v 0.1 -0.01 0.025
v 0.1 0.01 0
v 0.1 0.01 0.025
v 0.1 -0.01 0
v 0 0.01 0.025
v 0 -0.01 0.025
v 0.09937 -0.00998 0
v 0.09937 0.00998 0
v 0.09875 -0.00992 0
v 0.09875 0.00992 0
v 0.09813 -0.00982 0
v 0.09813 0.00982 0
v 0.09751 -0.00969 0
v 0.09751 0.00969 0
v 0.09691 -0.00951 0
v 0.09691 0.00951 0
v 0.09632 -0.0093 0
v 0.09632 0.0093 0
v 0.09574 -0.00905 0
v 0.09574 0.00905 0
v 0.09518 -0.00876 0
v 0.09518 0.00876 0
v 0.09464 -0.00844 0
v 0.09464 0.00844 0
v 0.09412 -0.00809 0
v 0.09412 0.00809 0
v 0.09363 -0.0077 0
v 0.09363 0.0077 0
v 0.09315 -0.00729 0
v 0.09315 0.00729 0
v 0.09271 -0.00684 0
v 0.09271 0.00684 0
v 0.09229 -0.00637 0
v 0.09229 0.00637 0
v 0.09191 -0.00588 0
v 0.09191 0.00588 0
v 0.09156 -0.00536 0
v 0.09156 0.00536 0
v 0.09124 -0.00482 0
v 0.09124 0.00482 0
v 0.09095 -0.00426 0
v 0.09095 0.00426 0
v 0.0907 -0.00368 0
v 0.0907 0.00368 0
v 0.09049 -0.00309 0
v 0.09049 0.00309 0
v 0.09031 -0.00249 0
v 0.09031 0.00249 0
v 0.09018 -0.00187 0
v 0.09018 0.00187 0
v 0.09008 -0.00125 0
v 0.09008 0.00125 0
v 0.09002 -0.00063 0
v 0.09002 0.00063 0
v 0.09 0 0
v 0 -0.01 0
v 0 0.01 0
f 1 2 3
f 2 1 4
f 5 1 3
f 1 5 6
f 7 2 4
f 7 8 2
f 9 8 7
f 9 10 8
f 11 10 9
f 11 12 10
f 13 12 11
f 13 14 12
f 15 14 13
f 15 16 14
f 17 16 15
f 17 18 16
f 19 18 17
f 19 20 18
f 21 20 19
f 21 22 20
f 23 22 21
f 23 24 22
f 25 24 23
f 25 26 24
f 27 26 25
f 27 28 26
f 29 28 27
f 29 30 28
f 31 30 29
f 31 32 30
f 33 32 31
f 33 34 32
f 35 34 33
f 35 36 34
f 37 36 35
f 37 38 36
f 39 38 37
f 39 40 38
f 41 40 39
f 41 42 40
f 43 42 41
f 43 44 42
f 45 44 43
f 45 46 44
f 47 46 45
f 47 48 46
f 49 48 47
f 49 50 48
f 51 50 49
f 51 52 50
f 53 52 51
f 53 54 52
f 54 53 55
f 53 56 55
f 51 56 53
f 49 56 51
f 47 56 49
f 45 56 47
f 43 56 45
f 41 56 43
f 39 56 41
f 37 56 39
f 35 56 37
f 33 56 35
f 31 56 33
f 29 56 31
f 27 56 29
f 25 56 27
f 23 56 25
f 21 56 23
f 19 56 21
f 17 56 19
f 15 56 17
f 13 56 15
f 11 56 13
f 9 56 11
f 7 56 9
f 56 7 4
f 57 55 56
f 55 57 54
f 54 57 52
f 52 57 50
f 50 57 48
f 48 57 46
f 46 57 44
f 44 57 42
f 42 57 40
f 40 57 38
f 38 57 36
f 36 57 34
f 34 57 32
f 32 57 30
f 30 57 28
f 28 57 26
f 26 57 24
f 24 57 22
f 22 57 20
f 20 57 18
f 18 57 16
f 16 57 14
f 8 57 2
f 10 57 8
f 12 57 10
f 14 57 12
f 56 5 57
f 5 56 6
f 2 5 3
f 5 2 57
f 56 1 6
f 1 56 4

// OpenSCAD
s = 1;

length = 0.1;
width = 0.025;
depth = 0.020;
chfdepth = 0;
chfangle = 45;
cutpos = 0.1;
cutoffset = 0.0;
cutdepth = 0.0;
cutdiameter = 0.02;

/* Produces basic box finger */
module basicShape(length, width, depth)
{
	translate([0, -depth/2, 0]) cube([length, depth, width]);
}

/* Produces the chamfering geometry.
 * length -- length of the finger
 * start_depth -- distance from the finger plane at which the chamfer starts
 * angle --- chamfering angle
 */
module chamfering(length, start_depth, angle) {
	size = 1000;

	translate([length, 0, start_depth])
		rotate([0, 90-angle, 0])
			translate([0, 0, size/2])
				cube(size, center = true);
}

/* Produces the geometry for the cutout.
 * cutpos -- the position of the cutout
 * cutoffset -- the offset along the y axis
 * cutdepth -- the depth of the cutout
 * cutdiameter -- the diameter of the cutout
 */
module cutout(cutpos, cutoffset, cutdepth, cutdiameter) {
	size = 1000;

	translate([cutpos, cutoffset, -size + cutdepth])
		cylinder(h = size, r = cutdiameter/2, $fn = 100);
}

/* Produces the finger geometry.
 * Parameters...
 */
module finger(length, width, depth, chfdepth, chfangle, cutpos, cutoffset, cutdepth, cutdiameter) {
	difference() {
		difference() {
			basicShape(length, width, depth);
			chamfering(length, width - width * chfdepth, chfangle);

echo(depth - chfdepth);
		}
		cutout(cutpos, cutoffset, cutdepth, cutdiameter);
	}
}

scale(s)
	finger(length, width, depth, chfdepth, chfangle, cutpos, cutoffset, cutdepth, cutdiameter);
